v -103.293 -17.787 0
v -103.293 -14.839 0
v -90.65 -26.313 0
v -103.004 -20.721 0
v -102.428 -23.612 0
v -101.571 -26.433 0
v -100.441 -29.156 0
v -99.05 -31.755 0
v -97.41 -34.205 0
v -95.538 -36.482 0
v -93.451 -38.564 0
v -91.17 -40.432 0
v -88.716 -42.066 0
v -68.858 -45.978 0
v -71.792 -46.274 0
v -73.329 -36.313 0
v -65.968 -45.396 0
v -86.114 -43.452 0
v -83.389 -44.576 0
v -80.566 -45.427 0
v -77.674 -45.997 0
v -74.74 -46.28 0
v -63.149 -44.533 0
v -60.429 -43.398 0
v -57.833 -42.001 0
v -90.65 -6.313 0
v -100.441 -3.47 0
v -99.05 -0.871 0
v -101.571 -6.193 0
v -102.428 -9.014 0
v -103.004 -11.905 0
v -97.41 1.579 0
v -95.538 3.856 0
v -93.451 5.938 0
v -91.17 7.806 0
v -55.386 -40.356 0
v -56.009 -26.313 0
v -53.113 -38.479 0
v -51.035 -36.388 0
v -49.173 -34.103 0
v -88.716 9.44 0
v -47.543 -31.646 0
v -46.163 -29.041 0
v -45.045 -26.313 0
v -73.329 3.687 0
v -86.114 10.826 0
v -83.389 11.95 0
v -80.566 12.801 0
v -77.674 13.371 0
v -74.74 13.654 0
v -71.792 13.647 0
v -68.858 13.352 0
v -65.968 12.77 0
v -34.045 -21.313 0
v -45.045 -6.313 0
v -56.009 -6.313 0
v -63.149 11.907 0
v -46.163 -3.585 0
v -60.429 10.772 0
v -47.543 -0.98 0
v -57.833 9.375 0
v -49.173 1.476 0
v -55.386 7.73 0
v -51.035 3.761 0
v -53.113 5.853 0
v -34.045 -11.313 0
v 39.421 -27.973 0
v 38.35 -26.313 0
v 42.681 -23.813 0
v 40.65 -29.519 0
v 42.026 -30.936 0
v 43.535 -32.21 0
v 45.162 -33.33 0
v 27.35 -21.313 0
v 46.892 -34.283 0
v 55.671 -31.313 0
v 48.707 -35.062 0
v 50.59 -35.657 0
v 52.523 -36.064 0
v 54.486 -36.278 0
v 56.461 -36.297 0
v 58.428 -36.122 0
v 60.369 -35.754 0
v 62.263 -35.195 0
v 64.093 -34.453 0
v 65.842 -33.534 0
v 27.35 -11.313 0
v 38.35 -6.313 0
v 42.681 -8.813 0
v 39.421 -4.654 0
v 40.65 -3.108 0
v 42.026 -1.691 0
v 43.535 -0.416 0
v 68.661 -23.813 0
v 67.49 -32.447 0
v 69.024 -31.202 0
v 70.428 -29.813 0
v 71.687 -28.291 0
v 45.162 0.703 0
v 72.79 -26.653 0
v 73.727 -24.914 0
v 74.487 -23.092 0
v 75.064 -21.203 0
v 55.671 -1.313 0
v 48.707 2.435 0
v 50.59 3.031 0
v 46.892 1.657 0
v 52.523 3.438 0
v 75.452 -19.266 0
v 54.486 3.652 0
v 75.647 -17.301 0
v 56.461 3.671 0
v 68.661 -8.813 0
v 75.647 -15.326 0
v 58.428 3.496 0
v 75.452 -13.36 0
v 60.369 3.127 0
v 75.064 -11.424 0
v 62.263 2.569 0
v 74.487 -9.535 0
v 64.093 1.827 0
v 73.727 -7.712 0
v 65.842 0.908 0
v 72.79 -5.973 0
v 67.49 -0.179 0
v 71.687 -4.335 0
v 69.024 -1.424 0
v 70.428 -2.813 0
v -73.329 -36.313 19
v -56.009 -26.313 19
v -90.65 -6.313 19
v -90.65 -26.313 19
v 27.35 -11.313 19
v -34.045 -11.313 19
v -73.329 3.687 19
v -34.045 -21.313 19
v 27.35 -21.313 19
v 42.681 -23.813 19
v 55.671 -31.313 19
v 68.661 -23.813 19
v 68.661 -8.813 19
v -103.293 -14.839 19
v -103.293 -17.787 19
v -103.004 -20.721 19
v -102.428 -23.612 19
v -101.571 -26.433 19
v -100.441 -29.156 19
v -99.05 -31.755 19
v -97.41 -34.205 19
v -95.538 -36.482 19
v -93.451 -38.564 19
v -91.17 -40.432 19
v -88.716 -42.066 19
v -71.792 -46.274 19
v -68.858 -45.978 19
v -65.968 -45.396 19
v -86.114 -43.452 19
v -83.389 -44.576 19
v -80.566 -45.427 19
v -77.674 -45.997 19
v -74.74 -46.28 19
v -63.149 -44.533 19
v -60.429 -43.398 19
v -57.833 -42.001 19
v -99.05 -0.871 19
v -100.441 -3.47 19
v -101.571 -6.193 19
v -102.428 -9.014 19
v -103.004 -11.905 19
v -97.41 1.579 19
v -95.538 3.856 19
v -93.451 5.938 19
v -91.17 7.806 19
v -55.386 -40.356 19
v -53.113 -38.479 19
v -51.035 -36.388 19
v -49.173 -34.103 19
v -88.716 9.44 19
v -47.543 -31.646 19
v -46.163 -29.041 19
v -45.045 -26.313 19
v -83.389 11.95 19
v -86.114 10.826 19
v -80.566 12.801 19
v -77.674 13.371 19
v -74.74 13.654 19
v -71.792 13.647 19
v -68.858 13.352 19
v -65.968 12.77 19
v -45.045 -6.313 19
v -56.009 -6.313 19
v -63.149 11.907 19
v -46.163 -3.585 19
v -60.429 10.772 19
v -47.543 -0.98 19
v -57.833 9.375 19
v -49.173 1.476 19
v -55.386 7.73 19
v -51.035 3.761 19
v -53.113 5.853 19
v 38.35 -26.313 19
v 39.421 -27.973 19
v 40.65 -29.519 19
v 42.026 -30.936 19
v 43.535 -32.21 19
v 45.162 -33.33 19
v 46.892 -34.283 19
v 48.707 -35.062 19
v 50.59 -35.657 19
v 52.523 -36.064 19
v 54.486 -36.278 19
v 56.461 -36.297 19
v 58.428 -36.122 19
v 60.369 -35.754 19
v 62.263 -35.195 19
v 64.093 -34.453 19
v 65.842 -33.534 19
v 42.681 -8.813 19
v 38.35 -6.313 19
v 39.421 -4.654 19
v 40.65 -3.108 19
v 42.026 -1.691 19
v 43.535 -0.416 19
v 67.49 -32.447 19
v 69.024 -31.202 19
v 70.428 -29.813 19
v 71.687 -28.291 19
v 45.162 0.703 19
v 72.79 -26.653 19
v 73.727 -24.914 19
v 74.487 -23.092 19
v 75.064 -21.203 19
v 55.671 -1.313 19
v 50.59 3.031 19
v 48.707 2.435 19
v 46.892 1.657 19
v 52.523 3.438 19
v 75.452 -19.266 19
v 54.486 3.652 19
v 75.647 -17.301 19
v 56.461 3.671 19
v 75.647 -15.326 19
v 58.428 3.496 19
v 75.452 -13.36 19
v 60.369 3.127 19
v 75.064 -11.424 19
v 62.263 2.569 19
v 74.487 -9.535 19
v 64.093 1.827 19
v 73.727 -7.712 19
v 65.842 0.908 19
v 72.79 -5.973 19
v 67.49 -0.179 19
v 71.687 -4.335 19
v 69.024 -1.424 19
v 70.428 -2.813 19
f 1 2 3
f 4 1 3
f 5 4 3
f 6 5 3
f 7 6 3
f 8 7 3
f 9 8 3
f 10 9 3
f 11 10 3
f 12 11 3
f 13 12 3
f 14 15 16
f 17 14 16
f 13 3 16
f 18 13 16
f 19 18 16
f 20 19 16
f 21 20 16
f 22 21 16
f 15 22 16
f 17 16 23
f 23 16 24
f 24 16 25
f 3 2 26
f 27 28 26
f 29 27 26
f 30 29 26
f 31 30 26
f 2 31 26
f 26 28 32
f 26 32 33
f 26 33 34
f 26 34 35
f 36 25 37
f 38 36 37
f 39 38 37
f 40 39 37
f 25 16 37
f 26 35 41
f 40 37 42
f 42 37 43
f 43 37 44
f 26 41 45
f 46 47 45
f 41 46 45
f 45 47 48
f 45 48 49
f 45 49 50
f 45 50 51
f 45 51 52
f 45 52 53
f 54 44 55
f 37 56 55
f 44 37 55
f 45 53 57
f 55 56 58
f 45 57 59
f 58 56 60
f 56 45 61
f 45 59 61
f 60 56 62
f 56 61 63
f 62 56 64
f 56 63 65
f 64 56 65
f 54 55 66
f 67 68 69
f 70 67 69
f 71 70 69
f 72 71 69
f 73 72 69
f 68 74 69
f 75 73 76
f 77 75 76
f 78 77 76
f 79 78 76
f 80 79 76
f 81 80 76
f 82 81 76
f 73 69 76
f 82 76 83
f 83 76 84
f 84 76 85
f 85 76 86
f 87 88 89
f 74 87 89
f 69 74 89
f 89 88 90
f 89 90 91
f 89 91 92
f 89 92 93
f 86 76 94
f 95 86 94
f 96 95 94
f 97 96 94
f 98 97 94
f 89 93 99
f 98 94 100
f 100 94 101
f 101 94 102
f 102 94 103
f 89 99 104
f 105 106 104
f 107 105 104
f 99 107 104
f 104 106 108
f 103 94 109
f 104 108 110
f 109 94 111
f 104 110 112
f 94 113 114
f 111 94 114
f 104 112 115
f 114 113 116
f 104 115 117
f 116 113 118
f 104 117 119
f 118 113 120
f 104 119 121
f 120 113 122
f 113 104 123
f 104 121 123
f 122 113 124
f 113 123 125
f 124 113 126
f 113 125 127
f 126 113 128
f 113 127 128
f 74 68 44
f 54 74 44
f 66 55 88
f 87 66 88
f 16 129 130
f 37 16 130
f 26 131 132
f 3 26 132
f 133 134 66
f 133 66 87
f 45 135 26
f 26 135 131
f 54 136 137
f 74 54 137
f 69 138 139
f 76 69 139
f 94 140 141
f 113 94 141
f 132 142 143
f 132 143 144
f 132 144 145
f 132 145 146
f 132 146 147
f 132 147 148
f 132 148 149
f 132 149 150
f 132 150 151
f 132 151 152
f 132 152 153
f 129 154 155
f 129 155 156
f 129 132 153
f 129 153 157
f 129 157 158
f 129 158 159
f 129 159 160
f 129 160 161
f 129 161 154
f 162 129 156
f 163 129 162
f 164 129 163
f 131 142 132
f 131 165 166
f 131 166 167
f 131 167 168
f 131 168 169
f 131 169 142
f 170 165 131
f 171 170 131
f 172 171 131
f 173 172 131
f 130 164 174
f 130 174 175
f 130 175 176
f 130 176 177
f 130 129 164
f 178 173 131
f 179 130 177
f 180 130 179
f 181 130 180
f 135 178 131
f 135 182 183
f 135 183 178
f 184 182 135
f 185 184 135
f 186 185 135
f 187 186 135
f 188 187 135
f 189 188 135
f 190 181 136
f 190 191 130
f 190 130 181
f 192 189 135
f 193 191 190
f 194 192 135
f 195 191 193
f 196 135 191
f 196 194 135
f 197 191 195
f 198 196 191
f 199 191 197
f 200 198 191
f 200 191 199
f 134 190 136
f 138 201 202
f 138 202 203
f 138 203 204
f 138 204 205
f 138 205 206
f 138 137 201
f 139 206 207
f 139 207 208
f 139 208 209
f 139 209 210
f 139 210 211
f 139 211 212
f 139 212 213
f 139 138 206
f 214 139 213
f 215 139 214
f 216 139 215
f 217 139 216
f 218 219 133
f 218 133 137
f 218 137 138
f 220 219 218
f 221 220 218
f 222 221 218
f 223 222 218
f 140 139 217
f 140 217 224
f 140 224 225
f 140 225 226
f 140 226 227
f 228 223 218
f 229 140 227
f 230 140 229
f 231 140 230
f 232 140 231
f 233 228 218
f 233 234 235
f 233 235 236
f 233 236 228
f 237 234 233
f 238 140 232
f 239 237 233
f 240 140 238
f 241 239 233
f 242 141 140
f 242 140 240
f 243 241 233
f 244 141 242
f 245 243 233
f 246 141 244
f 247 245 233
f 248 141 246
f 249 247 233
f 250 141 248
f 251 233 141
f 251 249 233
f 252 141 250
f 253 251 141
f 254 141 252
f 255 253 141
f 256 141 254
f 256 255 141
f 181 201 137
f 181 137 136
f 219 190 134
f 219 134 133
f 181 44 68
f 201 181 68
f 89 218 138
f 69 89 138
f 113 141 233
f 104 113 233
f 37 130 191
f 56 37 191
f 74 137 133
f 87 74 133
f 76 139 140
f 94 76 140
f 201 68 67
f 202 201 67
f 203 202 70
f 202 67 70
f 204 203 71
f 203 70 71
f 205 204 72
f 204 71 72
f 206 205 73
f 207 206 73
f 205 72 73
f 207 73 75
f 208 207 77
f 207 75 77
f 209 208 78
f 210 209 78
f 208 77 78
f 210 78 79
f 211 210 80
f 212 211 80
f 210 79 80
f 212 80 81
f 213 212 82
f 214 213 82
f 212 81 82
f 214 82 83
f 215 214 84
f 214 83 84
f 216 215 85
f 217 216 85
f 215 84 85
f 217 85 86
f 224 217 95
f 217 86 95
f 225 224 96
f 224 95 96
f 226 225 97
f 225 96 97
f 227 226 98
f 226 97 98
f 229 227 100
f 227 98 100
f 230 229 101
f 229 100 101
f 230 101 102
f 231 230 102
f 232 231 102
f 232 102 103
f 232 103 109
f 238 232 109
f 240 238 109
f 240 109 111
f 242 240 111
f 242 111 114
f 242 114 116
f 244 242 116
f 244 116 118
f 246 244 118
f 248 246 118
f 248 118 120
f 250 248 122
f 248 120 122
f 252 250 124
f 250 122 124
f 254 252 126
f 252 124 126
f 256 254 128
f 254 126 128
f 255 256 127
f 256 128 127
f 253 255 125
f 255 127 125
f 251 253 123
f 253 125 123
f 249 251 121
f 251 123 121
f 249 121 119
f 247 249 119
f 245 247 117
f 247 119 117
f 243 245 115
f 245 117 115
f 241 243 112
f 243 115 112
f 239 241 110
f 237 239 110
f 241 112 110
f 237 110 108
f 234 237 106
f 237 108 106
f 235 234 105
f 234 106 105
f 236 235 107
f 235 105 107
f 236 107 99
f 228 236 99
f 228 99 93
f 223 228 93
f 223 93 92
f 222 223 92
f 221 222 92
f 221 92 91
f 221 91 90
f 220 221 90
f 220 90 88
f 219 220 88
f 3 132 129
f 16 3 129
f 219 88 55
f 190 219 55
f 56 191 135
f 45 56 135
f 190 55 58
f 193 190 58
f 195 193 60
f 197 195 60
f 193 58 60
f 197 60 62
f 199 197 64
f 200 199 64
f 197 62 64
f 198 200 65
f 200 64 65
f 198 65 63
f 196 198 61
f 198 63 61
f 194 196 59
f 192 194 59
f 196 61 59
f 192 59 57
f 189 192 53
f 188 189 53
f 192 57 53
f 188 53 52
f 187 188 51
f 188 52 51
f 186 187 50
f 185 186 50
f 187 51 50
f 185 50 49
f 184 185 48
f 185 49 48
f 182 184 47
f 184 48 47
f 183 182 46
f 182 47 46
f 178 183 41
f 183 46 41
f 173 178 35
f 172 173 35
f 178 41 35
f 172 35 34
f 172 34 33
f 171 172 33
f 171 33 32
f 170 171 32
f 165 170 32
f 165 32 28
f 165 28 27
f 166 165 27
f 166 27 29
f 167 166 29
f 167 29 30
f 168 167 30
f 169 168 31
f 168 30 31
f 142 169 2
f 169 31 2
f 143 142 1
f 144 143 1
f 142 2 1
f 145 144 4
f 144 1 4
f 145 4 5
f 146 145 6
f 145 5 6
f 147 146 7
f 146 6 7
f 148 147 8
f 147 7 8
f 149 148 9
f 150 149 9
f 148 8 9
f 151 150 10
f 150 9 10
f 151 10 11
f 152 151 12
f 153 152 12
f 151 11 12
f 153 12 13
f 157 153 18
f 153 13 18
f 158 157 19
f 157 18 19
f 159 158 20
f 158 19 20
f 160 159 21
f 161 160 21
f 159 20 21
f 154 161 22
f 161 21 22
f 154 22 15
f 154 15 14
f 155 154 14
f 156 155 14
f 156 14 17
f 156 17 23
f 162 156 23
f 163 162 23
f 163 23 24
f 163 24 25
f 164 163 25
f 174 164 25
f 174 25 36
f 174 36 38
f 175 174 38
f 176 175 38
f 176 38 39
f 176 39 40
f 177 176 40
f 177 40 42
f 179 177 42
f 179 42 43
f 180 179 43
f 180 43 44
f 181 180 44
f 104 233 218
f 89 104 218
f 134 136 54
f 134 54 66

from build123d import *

# Parameters (mm, degrees)
BOSS_EXTRUDE4_DEPTH = 19
SKETCH3_W           = 61.395220677
SKETCH3_H           = 10
CUT_EXTRUDE2_DEPTH  = 19


with BuildPart() as part:
    # Sketch1 → Boss-Extrude4 (new body)
    with BuildSketch(Plane.XY):
        with BuildLine():
            Line((-45.044820263, -26.313108204), (38.350400414, -26.313108204))
            ThreePointArc((38.350400414, -26.313108204), (75.67090849, -16.313108204), (38.350400414, -6.313108204))
            Line((38.350400414, -6.313108204), (-45.044820263, -6.313108204))
            ThreePointArc((-45.044820263, -6.313108204), (-103.32909151, -16.313108204), (-45.044820263, -26.313108204))
        make_face()
    extrude(amount=BOSS_EXTRUDE4_DEPTH)

    # Sketch3 → Cut-Extrude2 (cut)
    with BuildSketch(Plane.XY.offset(19)):
        Polygon((-73.32909151, 3.686891796), (-90.649599586, -6.313108204), (-90.649599586, -26.313108204), (-73.32909151, -36.313108204), (-56.008583435, -26.313108204), (-56.008583435, -6.313108204), align=None)
        Polygon((55.67090849, -1.313108204), (42.680527433, -8.813108204), (42.680527433, -23.813108204), (55.67090849, -31.313108204), (68.661289547, -23.813108204), (68.661289547, -8.813108204), align=None)
        with Locations((-3.347209925, -16.313108204)):
            Rectangle(SKETCH3_W, SKETCH3_H)
    extrude(amount=-CUT_EXTRUDE2_DEPTH, mode=Mode.SUBTRACT)


solid = part.part
